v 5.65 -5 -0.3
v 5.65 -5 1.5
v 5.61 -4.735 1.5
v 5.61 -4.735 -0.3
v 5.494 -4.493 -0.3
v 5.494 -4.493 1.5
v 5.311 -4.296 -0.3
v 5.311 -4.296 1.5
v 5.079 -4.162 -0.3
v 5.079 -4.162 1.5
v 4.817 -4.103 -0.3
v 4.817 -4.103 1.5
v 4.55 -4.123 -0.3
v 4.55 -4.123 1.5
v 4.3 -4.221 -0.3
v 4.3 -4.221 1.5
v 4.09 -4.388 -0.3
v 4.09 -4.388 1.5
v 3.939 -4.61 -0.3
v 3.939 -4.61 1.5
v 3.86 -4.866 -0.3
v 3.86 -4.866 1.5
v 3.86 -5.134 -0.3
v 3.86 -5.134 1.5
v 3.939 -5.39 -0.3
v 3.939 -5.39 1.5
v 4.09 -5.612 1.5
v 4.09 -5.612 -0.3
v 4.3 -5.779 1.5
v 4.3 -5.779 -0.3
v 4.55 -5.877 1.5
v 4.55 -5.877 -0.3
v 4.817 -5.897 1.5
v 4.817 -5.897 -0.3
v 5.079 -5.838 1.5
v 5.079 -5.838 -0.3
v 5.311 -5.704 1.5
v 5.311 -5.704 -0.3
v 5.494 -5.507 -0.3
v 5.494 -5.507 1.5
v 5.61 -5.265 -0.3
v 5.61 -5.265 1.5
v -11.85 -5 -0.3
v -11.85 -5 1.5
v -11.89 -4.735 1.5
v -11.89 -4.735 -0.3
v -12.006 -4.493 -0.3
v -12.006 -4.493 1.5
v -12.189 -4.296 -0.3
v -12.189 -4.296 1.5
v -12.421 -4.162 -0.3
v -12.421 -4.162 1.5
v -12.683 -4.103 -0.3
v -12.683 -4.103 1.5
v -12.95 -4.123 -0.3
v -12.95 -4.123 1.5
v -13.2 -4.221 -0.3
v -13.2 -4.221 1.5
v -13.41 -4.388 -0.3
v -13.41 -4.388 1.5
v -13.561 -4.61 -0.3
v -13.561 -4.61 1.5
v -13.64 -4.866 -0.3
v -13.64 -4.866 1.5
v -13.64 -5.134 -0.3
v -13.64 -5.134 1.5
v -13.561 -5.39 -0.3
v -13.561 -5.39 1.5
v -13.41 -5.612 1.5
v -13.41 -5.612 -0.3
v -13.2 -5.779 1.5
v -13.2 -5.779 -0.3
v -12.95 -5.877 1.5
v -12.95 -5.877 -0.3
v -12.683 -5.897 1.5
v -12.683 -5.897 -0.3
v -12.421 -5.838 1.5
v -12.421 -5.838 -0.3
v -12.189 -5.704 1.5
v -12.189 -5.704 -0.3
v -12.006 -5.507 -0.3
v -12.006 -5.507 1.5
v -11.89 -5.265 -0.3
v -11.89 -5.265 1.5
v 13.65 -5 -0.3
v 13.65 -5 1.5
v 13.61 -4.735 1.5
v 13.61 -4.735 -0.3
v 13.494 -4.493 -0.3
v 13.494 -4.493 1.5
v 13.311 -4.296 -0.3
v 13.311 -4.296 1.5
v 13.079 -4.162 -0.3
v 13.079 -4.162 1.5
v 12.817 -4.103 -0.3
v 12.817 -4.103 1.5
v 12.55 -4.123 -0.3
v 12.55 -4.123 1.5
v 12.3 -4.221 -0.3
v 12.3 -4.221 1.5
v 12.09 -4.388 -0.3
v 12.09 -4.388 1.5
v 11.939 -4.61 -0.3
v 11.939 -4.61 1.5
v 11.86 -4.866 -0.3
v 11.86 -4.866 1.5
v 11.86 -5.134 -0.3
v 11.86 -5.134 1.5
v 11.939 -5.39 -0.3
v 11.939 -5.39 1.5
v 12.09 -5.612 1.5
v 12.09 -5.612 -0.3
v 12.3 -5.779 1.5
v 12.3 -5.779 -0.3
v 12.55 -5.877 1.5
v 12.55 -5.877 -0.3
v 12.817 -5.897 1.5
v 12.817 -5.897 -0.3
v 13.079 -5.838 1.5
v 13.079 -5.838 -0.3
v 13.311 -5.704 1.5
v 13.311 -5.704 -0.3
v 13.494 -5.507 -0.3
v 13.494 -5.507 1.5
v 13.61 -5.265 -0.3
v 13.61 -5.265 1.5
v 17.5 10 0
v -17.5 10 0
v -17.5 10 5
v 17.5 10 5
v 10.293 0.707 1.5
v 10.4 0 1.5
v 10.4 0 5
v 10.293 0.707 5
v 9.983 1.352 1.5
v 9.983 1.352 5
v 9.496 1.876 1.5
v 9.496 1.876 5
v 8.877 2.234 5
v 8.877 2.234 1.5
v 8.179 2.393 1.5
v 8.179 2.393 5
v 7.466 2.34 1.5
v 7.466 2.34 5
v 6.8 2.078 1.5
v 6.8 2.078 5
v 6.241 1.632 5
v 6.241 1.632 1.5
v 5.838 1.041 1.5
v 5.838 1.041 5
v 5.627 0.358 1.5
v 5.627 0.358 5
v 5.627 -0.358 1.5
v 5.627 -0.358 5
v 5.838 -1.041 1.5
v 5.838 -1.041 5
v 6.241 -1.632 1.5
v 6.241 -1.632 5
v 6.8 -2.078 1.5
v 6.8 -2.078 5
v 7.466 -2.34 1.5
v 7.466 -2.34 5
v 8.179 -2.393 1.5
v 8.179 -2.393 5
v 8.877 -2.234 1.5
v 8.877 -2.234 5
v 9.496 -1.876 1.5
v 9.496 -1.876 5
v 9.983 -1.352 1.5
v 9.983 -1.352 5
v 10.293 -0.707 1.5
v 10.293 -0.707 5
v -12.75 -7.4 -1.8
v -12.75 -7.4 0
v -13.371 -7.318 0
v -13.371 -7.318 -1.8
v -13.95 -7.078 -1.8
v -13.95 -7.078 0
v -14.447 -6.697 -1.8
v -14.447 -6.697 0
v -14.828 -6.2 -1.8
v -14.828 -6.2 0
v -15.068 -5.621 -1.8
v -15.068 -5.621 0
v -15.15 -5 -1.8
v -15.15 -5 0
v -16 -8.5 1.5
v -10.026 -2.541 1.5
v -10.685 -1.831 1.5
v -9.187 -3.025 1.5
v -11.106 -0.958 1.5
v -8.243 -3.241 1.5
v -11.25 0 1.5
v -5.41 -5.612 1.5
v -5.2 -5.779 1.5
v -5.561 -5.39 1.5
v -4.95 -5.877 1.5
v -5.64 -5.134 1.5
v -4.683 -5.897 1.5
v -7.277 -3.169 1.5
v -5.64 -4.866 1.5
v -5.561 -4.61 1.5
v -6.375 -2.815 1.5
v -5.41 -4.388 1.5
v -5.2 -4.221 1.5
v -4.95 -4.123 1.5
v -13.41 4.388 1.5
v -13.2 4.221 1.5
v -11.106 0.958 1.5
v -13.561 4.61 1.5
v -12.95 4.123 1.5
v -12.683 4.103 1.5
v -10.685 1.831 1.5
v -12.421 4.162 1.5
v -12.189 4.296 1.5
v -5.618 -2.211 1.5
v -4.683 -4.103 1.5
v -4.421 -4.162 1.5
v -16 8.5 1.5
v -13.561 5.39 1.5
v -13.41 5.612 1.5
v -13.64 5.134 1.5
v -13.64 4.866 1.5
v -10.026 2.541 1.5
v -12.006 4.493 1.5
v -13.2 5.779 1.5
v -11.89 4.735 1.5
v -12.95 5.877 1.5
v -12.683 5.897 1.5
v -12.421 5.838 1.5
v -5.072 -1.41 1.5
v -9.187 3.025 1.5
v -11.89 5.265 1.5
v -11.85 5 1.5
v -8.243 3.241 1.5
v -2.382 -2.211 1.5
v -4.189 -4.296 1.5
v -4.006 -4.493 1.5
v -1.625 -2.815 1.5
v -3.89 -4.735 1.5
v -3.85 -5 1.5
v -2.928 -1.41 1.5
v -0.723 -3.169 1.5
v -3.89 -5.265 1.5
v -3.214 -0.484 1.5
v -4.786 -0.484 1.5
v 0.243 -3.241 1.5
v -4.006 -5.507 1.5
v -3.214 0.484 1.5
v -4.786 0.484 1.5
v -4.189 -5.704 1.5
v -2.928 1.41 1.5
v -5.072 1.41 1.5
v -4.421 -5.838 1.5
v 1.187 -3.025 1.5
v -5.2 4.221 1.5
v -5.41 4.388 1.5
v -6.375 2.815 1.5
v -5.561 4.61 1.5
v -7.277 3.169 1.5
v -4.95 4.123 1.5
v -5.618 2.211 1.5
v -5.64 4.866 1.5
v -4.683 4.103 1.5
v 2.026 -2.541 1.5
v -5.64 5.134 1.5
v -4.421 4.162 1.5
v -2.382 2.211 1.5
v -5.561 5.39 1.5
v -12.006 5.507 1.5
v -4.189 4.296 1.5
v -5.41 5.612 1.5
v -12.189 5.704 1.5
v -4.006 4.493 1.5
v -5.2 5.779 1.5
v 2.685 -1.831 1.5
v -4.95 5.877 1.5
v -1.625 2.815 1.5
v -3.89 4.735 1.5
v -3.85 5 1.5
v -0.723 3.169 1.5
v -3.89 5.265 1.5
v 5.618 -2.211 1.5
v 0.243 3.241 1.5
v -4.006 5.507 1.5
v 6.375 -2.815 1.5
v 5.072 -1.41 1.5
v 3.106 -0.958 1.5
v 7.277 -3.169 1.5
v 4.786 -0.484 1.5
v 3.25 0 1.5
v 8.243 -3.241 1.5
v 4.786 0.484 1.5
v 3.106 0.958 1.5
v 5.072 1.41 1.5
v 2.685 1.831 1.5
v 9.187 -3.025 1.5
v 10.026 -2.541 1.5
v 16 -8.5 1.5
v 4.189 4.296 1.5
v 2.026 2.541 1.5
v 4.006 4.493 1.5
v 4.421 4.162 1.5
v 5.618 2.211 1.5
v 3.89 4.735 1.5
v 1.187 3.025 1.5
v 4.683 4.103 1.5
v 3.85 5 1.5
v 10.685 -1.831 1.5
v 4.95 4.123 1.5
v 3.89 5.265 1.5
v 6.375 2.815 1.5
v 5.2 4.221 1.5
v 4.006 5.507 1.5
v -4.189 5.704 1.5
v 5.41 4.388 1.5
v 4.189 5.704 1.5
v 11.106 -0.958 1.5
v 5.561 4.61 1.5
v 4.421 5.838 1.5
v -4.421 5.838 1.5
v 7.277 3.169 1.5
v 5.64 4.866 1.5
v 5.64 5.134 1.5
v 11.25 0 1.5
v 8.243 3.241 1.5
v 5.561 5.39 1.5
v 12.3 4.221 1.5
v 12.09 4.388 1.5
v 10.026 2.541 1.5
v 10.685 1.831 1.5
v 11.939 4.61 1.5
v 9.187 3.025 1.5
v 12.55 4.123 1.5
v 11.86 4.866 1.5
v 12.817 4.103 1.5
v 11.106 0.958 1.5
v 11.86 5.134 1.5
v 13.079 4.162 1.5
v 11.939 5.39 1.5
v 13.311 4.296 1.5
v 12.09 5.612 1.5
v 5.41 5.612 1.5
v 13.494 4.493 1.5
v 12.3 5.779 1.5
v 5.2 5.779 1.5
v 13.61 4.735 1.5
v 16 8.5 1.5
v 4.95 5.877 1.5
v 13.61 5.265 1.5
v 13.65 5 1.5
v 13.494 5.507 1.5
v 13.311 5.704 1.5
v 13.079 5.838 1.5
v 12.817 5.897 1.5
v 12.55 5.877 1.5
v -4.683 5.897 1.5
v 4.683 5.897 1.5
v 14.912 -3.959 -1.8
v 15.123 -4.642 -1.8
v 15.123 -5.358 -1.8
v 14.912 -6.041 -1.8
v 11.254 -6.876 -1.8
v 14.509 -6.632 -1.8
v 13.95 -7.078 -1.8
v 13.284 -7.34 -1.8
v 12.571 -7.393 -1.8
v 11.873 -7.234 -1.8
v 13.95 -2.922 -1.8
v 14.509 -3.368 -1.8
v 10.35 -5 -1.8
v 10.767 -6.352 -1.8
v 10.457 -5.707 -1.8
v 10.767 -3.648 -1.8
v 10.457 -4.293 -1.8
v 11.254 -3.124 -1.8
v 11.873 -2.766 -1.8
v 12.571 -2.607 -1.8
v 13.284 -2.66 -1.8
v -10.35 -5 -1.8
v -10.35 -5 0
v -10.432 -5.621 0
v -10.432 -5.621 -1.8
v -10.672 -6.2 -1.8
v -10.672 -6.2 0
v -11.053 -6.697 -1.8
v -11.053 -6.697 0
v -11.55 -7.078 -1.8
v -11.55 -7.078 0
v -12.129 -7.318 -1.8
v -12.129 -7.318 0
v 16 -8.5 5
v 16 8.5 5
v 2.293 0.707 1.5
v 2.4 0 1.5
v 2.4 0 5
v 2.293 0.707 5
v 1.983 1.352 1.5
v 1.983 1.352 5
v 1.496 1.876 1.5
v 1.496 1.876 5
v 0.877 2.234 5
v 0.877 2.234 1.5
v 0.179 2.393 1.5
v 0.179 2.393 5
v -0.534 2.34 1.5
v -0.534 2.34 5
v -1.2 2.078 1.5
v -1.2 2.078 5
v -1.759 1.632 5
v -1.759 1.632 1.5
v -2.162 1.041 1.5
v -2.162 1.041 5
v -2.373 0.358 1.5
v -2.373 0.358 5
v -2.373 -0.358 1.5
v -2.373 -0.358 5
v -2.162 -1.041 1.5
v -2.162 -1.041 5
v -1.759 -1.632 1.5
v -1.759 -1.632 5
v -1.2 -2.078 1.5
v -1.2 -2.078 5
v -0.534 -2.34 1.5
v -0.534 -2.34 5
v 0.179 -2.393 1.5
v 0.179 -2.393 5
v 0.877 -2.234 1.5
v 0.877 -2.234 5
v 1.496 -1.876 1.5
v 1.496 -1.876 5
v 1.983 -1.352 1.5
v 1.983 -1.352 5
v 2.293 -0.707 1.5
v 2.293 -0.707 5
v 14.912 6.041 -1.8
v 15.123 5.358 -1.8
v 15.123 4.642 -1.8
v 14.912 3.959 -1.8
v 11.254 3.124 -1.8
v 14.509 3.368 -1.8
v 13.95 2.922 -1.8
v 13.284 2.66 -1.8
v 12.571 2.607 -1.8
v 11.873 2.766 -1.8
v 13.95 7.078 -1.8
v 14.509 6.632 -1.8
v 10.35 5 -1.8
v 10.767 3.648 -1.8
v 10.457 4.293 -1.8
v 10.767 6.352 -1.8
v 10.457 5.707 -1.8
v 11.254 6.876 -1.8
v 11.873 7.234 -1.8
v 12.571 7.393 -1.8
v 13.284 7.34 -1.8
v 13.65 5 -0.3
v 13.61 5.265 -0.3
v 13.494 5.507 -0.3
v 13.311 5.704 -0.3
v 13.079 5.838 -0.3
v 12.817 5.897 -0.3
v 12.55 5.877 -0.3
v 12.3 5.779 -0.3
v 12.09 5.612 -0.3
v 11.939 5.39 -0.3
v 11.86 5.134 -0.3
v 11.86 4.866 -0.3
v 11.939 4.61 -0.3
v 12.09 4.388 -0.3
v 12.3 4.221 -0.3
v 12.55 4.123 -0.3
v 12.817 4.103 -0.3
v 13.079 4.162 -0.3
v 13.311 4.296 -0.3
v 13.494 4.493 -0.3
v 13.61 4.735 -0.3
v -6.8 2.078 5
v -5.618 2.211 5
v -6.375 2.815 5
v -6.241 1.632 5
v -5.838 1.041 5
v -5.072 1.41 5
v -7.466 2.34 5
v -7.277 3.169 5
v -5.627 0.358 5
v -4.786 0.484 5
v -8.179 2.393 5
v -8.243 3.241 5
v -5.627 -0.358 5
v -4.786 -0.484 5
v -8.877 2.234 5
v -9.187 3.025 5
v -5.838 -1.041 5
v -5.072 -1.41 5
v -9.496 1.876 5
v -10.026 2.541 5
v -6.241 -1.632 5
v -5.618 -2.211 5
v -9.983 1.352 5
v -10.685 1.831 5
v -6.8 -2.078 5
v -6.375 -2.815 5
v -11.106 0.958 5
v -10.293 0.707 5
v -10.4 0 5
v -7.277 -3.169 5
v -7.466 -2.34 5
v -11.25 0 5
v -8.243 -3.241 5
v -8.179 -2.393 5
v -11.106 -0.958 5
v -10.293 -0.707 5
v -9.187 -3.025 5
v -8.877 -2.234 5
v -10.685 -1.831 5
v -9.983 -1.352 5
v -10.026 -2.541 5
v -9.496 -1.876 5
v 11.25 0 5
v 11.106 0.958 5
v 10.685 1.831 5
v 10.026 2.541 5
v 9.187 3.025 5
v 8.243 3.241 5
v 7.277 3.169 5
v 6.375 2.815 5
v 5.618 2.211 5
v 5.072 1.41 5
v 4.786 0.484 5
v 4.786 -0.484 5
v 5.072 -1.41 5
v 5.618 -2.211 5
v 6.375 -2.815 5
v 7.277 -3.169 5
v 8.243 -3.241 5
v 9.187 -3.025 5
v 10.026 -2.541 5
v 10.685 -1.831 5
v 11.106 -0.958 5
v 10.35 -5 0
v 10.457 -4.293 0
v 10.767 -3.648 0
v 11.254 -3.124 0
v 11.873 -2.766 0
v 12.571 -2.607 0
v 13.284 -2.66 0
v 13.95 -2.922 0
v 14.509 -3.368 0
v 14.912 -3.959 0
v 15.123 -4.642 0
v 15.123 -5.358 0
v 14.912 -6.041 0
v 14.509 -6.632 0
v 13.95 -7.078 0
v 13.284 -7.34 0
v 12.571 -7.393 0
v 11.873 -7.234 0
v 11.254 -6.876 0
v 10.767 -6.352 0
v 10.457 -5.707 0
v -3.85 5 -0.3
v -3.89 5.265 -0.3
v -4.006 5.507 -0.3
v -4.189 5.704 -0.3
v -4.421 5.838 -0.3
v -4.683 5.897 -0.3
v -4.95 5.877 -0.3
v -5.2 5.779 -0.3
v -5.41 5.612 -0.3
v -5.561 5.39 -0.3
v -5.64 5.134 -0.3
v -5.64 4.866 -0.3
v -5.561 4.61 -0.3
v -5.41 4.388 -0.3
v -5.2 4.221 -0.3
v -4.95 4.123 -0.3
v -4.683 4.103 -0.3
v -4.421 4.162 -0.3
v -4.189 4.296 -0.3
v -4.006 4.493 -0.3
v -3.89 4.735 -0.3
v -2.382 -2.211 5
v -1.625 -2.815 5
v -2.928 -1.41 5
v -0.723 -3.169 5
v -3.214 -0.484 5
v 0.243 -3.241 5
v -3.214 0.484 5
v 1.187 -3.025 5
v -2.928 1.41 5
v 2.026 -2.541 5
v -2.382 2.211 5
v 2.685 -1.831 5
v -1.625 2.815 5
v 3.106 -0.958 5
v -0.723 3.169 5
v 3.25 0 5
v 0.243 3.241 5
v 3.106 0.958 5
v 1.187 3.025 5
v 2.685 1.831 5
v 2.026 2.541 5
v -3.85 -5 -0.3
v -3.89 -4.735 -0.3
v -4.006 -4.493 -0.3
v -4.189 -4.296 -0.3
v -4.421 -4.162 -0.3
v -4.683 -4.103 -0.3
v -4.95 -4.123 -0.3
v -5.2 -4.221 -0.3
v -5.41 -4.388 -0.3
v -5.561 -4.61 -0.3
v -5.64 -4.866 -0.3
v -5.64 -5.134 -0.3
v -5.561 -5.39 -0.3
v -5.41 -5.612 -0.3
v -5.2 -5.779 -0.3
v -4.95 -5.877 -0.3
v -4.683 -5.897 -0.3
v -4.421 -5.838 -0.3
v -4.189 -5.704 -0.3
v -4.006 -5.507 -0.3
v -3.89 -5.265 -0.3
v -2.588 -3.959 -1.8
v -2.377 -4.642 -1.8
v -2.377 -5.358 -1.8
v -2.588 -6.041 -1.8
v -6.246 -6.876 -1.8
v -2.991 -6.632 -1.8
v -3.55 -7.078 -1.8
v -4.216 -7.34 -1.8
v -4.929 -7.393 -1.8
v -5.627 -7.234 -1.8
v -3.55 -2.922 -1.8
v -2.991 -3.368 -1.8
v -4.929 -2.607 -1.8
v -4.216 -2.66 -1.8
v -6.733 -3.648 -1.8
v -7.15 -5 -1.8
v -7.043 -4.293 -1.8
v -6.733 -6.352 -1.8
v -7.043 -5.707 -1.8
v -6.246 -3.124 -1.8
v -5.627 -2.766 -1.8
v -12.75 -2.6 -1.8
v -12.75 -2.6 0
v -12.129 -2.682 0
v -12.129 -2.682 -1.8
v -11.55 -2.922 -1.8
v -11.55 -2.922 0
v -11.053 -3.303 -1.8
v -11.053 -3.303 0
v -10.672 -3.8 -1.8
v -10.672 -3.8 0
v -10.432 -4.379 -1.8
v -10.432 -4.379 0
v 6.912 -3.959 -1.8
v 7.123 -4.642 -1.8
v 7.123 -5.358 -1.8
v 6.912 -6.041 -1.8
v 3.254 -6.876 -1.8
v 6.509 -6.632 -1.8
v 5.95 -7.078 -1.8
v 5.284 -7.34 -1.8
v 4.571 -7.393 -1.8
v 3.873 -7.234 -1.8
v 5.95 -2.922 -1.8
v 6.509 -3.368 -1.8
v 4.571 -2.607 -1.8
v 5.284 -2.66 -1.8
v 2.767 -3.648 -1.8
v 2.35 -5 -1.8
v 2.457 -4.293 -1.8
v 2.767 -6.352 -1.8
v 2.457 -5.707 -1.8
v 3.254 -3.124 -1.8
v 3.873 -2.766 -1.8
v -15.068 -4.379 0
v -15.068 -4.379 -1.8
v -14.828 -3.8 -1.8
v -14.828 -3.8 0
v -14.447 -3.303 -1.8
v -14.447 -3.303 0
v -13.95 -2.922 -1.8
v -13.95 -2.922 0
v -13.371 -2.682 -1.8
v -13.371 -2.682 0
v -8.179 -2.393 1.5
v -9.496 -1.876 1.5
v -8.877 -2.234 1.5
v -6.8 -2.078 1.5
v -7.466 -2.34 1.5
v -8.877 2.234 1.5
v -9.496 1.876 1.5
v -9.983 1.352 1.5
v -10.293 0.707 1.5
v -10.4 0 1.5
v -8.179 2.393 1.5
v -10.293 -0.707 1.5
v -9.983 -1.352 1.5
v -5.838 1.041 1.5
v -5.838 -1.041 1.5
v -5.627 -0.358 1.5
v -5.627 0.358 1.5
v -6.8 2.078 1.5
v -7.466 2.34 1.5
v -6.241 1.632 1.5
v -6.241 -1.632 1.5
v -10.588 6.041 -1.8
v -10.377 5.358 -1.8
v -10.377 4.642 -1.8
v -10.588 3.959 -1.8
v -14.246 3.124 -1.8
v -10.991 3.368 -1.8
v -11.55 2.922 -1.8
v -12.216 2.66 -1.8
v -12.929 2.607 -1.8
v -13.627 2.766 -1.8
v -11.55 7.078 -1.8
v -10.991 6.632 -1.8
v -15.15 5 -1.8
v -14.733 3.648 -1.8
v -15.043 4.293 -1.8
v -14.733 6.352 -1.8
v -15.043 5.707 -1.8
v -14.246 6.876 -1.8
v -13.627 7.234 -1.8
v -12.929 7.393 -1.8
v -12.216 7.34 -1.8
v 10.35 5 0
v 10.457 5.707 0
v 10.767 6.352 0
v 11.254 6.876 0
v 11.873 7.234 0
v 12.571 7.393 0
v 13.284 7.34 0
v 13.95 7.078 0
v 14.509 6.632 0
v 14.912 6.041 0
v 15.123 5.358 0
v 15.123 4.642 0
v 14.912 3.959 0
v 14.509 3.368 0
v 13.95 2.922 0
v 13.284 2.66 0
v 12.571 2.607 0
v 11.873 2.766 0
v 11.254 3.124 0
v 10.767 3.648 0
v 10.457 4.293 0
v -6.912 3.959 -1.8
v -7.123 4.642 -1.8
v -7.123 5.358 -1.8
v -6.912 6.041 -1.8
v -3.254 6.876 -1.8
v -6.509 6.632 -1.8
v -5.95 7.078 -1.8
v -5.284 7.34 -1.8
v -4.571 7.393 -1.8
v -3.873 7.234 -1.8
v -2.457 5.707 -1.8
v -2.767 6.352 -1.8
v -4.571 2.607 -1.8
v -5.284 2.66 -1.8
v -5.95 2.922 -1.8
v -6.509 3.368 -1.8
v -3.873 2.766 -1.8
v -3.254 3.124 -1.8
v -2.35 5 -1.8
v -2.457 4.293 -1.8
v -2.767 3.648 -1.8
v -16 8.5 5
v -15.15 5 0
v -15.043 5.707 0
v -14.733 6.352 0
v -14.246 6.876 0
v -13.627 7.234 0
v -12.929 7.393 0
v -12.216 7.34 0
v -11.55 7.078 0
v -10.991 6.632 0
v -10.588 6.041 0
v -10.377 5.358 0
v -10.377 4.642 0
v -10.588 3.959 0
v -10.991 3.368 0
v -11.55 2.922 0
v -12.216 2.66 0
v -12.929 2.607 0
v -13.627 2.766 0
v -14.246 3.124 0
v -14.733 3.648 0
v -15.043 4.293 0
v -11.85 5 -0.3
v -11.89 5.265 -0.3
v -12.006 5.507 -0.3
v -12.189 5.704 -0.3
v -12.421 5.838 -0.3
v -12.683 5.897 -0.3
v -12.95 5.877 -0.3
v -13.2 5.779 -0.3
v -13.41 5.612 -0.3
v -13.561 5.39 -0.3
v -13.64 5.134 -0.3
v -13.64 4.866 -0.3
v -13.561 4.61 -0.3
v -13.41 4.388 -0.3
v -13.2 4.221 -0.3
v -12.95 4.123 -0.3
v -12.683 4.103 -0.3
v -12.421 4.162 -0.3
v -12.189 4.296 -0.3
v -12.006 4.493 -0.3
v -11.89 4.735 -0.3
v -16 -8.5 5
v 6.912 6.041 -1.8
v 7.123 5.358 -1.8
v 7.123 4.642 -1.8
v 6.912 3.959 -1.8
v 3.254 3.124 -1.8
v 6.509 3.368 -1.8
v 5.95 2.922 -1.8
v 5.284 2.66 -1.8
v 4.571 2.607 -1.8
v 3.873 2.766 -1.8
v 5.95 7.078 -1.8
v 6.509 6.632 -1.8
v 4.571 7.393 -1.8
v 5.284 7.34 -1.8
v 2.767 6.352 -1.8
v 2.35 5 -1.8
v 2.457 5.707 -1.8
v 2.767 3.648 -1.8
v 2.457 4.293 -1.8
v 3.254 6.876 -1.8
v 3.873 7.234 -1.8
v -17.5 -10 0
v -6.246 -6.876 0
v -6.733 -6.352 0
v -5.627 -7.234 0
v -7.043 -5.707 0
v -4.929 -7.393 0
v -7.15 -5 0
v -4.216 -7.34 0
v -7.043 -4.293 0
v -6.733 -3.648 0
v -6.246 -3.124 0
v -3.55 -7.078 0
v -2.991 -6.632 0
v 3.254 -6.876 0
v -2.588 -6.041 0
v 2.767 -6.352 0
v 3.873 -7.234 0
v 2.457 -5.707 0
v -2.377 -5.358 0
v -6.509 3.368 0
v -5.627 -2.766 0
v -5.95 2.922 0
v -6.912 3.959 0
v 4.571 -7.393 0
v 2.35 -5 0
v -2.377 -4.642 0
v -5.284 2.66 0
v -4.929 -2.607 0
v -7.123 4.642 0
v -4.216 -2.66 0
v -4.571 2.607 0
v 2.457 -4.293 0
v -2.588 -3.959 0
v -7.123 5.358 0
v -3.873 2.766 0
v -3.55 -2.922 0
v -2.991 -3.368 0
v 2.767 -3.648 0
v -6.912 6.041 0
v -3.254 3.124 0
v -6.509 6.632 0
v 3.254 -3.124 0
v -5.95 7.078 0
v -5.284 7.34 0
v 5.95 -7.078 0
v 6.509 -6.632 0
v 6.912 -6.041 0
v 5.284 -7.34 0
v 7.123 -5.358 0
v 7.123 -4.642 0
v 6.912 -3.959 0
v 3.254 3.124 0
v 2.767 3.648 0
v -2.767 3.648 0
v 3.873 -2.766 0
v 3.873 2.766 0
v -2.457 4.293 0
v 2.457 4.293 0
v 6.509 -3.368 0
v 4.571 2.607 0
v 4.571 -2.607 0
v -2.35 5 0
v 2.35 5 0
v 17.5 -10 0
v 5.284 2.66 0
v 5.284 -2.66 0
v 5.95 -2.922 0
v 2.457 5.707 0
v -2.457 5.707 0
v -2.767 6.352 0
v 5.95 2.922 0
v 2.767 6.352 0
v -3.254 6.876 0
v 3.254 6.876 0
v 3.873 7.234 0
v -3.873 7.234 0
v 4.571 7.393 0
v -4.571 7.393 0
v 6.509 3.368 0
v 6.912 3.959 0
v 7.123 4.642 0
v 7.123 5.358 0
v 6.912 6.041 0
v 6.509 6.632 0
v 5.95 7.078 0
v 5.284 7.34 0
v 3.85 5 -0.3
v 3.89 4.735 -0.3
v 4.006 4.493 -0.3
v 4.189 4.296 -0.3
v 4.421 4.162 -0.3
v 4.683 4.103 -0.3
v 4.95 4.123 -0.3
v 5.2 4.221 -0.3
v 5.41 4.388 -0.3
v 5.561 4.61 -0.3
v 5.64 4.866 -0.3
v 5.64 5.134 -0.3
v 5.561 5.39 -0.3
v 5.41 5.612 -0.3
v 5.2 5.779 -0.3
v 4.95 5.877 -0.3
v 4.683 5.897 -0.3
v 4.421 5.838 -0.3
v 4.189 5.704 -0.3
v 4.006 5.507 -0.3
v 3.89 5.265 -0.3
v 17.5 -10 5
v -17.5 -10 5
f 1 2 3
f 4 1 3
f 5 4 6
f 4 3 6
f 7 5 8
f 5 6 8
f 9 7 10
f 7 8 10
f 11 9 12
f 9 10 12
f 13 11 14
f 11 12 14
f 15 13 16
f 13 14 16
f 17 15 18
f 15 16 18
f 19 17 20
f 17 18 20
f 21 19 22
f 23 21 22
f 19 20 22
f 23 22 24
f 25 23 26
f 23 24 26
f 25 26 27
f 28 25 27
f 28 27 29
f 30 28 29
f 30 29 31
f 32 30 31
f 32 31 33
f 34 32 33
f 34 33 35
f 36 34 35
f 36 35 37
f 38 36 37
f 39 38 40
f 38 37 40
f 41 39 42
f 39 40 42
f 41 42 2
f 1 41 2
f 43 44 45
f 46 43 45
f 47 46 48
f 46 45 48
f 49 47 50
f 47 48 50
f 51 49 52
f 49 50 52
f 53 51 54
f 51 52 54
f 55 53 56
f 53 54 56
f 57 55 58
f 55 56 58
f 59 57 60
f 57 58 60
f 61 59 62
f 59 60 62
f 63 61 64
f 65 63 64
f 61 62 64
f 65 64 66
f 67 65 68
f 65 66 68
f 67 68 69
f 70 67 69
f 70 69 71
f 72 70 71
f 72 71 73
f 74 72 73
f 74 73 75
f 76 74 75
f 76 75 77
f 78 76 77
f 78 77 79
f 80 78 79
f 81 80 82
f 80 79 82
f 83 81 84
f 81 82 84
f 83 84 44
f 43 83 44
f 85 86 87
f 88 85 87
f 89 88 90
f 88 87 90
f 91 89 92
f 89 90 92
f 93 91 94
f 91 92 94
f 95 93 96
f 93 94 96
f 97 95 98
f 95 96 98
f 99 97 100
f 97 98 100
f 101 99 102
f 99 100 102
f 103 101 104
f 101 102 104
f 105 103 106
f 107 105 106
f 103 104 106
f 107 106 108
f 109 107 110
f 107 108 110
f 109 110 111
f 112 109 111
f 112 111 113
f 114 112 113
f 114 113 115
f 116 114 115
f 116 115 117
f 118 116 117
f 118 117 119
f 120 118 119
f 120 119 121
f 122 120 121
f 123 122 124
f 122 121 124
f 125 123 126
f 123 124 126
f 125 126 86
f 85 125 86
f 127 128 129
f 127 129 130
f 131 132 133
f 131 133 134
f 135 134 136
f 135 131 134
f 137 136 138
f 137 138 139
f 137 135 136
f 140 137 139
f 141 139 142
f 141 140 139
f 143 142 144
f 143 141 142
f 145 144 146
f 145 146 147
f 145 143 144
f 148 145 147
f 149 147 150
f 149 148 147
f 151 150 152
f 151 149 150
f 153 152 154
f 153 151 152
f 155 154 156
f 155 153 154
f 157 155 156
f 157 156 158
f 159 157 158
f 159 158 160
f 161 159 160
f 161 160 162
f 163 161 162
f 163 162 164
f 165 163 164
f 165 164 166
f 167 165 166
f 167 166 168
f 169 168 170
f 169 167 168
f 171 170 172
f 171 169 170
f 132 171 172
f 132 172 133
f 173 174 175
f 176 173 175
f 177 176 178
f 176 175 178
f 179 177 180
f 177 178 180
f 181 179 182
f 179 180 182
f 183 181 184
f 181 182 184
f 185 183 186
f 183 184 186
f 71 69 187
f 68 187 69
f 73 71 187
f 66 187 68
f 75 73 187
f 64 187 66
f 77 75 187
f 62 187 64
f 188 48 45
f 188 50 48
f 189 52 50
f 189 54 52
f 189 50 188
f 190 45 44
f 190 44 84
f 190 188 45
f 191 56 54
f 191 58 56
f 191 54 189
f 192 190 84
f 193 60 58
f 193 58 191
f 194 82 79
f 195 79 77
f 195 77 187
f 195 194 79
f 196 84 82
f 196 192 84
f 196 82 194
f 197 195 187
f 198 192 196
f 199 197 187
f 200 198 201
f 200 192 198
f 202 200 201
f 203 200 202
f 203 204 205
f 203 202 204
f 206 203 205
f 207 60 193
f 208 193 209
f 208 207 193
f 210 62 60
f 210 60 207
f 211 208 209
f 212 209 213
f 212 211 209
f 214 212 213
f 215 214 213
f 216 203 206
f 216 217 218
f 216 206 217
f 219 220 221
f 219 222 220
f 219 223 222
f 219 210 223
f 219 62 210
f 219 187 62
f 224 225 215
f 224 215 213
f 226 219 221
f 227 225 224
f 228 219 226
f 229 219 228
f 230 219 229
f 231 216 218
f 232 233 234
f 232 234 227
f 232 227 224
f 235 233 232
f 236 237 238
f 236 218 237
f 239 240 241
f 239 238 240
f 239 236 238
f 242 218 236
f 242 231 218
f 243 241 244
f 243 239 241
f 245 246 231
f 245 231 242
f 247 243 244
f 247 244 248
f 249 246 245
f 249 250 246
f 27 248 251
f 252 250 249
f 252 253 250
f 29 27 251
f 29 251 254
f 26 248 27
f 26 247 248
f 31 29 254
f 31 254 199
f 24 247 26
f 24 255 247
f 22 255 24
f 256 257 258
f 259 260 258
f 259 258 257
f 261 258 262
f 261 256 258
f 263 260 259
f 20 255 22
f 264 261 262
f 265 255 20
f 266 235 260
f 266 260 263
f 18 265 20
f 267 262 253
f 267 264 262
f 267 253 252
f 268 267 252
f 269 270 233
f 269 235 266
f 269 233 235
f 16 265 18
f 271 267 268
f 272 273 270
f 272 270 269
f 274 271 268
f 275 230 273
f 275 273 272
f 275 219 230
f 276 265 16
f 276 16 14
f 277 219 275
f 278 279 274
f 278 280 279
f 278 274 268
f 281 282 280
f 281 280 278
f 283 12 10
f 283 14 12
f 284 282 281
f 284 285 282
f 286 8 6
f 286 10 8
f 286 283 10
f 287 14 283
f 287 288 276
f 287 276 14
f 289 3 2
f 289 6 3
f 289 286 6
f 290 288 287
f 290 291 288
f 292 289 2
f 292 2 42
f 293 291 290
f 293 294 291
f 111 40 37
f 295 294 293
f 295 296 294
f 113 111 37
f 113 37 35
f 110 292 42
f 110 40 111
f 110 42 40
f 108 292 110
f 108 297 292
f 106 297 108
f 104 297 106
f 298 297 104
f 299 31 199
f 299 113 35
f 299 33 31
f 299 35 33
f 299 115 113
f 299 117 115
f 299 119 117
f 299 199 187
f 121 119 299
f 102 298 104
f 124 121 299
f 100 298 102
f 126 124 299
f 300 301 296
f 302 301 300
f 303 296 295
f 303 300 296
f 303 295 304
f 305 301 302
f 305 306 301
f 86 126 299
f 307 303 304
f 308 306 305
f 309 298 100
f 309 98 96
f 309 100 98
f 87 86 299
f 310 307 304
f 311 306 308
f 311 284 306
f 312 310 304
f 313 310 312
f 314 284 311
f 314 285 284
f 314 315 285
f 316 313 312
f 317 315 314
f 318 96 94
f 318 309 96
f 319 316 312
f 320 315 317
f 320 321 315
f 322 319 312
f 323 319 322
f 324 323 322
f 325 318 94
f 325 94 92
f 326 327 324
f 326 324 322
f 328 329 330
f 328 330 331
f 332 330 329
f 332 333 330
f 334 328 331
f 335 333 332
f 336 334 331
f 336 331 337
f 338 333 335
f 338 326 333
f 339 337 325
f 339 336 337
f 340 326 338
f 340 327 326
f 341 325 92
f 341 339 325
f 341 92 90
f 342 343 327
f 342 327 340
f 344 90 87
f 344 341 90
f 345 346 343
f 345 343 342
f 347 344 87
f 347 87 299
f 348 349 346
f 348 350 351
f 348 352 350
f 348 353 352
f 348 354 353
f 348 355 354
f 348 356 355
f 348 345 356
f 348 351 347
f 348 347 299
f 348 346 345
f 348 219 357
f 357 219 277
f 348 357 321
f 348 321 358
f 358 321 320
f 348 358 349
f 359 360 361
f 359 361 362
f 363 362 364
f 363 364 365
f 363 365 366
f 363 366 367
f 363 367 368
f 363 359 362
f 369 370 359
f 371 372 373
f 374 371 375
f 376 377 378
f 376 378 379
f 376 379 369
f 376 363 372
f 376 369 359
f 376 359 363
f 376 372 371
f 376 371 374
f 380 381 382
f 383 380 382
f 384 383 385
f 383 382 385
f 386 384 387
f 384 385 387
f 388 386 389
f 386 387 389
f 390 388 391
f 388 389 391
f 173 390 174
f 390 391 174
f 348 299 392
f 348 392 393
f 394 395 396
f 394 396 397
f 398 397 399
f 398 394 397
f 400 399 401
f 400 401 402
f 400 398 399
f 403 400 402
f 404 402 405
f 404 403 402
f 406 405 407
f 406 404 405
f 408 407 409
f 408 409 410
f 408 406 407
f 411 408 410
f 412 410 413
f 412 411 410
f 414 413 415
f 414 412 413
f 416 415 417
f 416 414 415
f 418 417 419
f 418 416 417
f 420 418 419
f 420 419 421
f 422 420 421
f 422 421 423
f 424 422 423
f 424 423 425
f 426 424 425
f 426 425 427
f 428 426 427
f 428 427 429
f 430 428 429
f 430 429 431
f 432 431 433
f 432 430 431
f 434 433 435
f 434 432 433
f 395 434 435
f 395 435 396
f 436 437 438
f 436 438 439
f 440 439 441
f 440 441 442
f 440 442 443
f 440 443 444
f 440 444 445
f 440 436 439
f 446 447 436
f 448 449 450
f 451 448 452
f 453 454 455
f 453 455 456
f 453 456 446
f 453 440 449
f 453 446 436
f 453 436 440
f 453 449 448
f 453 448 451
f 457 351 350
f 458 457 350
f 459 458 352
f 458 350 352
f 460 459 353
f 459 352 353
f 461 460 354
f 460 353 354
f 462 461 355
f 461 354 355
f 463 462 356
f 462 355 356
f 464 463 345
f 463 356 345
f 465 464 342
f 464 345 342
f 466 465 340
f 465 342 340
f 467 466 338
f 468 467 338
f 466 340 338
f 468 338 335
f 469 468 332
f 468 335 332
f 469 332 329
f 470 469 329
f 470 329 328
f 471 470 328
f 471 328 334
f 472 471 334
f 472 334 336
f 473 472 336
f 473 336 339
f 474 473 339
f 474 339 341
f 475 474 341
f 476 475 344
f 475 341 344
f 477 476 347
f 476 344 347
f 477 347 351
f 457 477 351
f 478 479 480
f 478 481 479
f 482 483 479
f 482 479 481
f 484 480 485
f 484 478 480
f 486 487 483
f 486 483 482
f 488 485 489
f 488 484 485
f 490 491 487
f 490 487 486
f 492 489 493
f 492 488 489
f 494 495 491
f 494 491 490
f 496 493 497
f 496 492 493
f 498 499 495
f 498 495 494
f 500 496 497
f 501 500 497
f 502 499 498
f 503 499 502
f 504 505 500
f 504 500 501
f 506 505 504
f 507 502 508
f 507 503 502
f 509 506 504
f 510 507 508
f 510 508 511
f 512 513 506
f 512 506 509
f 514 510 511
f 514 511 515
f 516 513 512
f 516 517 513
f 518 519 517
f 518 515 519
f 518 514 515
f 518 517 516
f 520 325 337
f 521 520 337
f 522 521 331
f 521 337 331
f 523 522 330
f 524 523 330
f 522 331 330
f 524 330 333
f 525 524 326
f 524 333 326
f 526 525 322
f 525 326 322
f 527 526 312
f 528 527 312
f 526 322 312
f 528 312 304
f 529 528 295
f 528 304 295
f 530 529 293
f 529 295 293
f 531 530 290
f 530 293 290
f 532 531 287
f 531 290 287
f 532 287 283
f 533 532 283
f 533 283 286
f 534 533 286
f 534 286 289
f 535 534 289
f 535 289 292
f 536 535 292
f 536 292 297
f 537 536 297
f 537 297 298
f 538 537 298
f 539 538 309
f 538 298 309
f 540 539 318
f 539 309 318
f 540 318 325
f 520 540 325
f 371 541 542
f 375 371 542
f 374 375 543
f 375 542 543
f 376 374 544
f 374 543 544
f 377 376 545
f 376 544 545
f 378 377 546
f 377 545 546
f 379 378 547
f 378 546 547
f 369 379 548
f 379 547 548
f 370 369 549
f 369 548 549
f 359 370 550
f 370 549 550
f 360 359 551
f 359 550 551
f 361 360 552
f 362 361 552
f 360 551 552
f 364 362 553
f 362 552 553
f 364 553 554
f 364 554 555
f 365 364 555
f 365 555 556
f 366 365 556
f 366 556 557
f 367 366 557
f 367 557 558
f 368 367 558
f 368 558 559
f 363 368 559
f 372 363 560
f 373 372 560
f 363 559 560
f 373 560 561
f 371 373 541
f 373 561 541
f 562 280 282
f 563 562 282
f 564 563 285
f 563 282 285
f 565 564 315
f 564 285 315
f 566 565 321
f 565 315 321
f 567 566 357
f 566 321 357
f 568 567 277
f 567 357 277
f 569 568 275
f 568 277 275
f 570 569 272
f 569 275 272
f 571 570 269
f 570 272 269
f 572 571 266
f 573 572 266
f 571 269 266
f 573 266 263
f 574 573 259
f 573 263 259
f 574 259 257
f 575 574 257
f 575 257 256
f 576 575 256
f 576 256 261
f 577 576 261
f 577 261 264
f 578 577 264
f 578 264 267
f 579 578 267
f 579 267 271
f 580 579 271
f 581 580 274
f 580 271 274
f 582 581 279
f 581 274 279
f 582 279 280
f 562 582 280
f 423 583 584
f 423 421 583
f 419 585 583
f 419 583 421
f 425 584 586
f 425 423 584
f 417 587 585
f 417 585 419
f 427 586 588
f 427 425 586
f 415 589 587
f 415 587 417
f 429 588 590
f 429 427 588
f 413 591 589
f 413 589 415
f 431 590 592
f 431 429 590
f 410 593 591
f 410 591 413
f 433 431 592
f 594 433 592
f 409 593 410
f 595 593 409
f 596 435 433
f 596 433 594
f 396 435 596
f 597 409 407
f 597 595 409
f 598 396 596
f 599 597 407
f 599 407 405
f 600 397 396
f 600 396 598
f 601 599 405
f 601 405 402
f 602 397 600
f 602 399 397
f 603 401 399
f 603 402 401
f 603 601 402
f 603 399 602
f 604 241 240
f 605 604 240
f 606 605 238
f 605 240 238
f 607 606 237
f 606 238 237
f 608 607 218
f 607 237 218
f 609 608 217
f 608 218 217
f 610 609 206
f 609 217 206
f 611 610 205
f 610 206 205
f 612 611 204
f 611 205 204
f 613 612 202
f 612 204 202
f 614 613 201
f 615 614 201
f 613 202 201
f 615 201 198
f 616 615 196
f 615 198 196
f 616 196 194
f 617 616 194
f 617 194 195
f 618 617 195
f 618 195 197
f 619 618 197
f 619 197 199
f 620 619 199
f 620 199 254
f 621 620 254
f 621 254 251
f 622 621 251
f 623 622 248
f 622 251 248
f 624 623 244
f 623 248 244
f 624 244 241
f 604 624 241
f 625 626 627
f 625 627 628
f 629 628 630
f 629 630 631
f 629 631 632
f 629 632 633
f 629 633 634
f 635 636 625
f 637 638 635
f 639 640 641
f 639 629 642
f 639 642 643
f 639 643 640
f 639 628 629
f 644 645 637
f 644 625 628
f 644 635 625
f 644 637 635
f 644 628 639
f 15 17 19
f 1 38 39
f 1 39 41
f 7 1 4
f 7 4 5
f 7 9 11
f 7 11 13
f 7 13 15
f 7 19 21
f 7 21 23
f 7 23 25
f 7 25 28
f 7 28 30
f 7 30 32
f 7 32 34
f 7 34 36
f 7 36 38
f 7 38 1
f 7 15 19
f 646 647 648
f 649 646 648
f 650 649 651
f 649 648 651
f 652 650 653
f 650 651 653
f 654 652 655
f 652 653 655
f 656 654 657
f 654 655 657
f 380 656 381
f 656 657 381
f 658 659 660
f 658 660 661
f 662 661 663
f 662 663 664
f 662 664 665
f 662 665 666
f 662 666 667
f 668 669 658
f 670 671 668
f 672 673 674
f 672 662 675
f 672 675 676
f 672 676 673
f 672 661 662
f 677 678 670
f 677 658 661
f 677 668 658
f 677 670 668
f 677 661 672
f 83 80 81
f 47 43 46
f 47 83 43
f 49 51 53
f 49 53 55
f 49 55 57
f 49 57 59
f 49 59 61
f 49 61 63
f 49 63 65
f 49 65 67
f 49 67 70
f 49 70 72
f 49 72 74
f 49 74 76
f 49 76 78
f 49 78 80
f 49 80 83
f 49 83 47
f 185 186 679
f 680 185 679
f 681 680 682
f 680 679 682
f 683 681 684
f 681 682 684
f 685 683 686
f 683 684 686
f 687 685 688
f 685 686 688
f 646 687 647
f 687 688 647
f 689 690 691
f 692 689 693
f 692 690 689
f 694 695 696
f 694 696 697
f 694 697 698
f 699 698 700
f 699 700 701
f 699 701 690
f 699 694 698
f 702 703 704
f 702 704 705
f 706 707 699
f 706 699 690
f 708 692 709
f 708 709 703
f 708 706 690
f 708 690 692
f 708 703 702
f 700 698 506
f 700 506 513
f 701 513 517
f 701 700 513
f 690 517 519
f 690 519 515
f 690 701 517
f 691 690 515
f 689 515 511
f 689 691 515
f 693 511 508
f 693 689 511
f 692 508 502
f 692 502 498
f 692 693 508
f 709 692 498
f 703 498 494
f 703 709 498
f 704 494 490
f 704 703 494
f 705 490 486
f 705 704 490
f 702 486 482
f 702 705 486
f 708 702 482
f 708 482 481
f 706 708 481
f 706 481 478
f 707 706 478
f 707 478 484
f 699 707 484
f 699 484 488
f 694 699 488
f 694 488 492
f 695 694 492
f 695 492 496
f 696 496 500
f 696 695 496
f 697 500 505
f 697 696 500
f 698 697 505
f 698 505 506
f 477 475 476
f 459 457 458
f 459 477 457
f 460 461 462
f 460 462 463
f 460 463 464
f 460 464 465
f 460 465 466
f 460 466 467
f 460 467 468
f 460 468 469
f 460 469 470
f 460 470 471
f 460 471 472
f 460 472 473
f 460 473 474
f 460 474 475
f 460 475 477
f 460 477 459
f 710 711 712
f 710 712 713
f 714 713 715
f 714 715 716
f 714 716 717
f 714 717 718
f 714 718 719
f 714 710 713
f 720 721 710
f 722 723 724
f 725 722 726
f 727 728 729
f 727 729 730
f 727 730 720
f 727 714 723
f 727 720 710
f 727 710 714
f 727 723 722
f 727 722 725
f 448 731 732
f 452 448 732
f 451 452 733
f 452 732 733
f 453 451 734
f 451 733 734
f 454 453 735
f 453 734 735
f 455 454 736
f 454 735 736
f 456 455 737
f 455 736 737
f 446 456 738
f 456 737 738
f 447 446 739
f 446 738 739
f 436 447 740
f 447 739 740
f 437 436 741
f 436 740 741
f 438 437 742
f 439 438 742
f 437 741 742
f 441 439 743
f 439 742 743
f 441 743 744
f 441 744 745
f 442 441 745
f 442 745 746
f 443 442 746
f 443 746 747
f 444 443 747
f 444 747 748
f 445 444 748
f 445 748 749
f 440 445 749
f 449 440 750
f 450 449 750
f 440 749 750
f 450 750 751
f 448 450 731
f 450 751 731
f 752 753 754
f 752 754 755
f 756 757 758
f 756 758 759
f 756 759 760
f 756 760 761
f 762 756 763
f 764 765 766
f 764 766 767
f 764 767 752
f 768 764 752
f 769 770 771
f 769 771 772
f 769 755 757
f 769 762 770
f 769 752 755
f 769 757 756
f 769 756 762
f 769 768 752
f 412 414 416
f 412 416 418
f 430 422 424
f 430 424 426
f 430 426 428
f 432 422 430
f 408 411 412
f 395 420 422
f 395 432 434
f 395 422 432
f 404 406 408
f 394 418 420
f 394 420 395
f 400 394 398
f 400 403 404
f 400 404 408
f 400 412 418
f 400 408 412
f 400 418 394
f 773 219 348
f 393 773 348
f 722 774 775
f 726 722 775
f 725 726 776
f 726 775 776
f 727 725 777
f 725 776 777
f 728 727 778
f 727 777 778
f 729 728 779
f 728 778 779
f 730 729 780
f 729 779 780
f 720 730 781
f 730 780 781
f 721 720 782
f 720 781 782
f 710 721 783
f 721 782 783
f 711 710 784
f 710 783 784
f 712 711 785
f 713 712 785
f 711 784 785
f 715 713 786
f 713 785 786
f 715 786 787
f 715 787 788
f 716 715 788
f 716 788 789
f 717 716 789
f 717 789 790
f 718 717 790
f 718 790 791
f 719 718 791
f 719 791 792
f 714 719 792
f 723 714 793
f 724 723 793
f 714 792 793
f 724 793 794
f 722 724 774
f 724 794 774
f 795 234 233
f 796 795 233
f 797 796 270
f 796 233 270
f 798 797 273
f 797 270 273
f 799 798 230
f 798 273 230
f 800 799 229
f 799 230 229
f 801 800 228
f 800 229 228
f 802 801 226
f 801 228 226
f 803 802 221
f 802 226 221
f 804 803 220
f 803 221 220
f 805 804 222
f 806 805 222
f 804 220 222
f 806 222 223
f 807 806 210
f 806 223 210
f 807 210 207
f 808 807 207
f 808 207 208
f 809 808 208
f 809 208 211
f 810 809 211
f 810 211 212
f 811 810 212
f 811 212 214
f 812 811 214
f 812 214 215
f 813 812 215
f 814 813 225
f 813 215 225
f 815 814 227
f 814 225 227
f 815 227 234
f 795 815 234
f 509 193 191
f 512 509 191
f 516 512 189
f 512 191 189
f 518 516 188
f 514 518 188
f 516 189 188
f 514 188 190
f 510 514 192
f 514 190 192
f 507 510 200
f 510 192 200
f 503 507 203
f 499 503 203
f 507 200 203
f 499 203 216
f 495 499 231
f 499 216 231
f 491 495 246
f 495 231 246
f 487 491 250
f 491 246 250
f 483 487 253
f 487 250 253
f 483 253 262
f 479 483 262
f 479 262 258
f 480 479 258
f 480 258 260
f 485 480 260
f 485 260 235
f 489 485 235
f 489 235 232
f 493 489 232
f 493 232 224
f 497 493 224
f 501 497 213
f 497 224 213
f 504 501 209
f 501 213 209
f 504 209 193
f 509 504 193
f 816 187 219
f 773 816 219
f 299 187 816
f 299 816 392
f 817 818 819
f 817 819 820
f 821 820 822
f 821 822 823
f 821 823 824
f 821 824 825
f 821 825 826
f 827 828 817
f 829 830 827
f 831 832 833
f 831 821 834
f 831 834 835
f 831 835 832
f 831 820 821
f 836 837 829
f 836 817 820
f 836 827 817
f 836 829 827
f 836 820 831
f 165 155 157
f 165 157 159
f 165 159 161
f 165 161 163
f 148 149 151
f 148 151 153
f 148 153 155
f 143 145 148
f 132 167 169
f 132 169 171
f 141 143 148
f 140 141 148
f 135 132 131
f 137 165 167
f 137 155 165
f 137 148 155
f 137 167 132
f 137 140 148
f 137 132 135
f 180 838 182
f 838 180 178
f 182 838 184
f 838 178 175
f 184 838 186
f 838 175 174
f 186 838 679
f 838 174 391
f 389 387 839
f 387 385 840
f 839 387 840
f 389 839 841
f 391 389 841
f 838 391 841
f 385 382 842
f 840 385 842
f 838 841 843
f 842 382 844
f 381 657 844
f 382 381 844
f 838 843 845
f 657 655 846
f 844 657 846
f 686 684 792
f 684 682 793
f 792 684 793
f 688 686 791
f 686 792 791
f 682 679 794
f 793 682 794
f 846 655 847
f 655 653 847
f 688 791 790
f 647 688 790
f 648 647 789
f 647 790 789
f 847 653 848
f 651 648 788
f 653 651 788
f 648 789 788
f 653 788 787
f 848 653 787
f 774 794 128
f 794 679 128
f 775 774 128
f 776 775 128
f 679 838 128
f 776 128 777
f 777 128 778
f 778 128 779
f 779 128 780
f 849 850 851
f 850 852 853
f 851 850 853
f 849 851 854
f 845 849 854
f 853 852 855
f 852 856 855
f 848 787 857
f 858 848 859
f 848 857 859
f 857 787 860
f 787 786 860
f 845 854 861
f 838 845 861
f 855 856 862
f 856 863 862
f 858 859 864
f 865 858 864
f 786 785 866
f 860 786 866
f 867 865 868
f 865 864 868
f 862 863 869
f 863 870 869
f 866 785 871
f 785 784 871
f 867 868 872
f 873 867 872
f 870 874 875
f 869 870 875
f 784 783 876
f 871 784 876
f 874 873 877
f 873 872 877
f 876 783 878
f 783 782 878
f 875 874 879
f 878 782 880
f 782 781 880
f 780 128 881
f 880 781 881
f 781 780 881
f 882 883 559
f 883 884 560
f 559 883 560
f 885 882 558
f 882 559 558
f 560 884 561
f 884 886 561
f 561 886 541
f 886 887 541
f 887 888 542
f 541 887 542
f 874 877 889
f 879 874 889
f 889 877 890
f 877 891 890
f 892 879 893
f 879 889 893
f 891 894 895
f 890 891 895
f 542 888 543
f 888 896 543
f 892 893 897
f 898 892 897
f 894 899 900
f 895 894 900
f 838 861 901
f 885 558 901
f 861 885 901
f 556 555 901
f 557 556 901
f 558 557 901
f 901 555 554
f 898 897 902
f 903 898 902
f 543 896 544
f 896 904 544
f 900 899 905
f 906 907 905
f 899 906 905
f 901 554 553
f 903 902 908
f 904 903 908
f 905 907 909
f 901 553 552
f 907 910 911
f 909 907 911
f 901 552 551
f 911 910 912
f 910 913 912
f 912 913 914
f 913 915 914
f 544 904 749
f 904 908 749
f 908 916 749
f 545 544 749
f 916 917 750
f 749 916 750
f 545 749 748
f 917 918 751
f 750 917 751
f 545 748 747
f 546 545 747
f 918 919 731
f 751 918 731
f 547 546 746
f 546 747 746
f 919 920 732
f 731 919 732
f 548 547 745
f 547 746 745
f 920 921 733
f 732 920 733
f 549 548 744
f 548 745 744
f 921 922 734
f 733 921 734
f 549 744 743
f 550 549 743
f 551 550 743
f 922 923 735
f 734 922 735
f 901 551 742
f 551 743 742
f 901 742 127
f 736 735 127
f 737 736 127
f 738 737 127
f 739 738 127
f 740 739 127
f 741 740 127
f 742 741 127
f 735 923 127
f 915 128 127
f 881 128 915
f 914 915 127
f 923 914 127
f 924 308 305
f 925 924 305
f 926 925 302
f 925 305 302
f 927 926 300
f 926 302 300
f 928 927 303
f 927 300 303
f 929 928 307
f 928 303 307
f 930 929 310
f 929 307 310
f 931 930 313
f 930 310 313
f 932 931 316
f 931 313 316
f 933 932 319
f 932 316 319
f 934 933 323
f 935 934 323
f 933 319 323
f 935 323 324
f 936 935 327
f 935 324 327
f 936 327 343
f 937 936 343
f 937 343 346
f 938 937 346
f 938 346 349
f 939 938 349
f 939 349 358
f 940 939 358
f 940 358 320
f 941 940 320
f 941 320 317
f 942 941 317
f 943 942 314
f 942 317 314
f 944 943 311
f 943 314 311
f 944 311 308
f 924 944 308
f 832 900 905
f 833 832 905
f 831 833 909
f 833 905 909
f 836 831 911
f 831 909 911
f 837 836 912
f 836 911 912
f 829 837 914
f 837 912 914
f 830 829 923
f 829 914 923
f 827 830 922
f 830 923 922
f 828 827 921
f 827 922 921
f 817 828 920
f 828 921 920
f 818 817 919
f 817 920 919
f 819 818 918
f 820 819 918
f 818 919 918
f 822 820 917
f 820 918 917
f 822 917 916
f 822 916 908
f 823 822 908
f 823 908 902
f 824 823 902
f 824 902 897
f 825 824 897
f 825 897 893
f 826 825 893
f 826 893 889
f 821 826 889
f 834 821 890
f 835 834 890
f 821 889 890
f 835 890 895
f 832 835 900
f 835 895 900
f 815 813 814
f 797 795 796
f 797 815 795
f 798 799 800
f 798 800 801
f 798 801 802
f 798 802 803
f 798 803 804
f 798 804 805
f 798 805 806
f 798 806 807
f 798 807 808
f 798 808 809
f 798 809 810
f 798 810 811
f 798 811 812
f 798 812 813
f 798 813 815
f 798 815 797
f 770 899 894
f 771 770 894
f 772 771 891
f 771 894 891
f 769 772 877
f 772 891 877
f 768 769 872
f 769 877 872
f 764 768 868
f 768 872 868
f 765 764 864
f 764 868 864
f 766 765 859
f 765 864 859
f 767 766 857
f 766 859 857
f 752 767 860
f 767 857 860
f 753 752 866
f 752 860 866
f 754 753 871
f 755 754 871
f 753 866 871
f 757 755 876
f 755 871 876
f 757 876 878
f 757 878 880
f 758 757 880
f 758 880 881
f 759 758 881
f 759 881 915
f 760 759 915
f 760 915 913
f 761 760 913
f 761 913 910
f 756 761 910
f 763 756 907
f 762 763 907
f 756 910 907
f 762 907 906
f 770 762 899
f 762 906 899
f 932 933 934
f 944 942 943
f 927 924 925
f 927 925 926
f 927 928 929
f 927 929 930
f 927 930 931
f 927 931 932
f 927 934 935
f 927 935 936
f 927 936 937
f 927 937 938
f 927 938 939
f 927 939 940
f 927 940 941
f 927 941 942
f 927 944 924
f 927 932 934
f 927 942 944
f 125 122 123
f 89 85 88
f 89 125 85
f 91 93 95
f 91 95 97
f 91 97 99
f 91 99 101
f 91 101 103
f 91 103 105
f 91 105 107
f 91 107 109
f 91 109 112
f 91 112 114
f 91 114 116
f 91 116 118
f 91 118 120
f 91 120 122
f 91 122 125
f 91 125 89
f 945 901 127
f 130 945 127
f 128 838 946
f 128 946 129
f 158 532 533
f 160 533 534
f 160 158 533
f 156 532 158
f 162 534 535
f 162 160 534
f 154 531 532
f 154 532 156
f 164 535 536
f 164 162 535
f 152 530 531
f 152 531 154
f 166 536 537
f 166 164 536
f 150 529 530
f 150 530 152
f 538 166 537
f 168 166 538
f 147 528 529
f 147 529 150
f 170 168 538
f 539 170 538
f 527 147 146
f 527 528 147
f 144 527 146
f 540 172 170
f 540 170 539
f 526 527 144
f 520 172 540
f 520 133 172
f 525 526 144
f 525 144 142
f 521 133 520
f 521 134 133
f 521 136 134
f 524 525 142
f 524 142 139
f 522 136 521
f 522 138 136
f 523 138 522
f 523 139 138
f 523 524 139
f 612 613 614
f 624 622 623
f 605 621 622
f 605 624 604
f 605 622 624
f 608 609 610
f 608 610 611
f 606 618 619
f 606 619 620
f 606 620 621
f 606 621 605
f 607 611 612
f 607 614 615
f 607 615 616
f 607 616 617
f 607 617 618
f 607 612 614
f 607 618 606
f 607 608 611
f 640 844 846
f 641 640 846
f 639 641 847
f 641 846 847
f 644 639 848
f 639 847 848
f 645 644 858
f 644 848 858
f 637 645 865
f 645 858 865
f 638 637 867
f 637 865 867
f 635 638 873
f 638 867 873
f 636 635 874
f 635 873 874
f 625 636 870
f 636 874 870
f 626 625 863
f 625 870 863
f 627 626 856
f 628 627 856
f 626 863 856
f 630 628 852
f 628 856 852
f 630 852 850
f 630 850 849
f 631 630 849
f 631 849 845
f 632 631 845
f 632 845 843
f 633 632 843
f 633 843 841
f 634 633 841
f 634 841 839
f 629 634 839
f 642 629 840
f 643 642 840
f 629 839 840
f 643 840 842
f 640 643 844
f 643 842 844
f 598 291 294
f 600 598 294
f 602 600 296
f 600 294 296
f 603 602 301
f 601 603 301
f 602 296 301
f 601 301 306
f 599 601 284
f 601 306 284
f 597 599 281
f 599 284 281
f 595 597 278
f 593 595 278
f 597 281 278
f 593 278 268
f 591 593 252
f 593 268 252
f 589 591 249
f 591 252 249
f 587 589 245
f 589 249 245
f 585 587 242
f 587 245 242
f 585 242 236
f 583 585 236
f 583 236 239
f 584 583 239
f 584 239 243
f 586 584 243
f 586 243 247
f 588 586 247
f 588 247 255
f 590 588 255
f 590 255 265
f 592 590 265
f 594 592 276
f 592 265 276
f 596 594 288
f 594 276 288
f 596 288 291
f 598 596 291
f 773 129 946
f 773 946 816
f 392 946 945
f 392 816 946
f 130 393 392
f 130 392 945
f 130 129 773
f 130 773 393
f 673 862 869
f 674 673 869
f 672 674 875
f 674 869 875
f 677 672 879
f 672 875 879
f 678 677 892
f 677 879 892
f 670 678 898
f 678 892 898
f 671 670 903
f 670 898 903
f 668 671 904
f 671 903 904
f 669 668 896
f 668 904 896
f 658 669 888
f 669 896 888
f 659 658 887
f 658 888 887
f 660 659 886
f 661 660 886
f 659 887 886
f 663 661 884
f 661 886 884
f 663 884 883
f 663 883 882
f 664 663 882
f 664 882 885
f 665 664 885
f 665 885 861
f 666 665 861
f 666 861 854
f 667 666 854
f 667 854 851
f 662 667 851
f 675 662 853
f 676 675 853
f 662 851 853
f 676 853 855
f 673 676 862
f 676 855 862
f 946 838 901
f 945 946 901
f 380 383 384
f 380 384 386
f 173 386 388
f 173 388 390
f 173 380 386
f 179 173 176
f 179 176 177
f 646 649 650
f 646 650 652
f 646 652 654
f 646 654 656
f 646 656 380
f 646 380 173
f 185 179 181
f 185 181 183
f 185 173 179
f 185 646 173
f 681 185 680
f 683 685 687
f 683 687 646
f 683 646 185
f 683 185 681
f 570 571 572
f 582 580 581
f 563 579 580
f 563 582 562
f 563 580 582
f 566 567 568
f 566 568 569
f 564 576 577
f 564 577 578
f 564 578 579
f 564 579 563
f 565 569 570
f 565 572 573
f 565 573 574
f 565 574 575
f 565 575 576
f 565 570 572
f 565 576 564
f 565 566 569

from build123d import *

# Parameters (mm, degrees)
SKETCH1_W           = 35
SKETCH1_H           = 20
SKETCH1_W_2         = 32
SKETCH1_H_2         = 17
BOSS_EXTRUDE1_DEPTH = 5
SKETCH2_W           = 32
SKETCH2_H           = 17
BOSS_EXTRUDE2_DEPTH = 1.5
SKETCH3_R           = 2.4
BOSS_EXTRUDE3_DEPTH = 1.8
SKETCH6_R           = 3.25
SKETCH6_R_2         = 2.4
BOSS_EXTRUDE4_DEPTH = 3.5
SKETCH7_R           = 0.9
CUT_EXTRUDE2_DEPTH  = 1.8


with BuildPart() as part:
    # Sketch1 → Boss-Extrude1 (new body)
    with BuildSketch(Plane.XY):
        Rectangle(SKETCH1_W, SKETCH1_H)
        Rectangle(SKETCH1_W_2, SKETCH1_H_2, mode=Mode.SUBTRACT)
    extrude(amount=BOSS_EXTRUDE1_DEPTH)

    # Sketch2 → Boss-Extrude2 (add)
    with BuildSketch(Plane.XY):
        Rectangle(SKETCH2_W, SKETCH2_H)
    extrude(amount=BOSS_EXTRUDE2_DEPTH)

    # Sketch3 → Boss-Extrude3 (add)
    with BuildSketch(Plane(origin=(0, 0, 0), x_dir=(-1, 0, 0), z_dir=(0, 0, -1))):
        with BuildLine():
            ThreePointArc((15.15, -5), (14.447056275, -3.302943725), (12.75, -2.6))
            Line((12.75, -2.6), (12.75, -5))
            Line((12.75, -5), (15.15, -5))
        make_face()
        with BuildLine():
            Line((12.75, -5), (12.75, -2.6))
            ThreePointArc((12.75, -2.6), (11.052943725, -3.302943725), (10.35, -5))
            Line((10.35, -5), (12.75, -5))
        make_face()
        with BuildLine():
            Line((12.75, -7.4), (12.75, -5))
            Line((12.75, -5), (10.35, -5))
            ThreePointArc((10.35, -5), (11.052943725, -6.697056275), (12.75, -7.4))
        make_face()
        with BuildLine():
            Line((15.15, -5), (12.75, -5))
            Line((12.75, -5), (12.75, -7.4))
            ThreePointArc((12.75, -7.4), (14.447056275, -6.697056275), (15.15, -5))
        make_face()
        with Locations((12.75, 5)):
            Circle(SKETCH3_R)
        with Locations((-4.75, 5)):
            Circle(SKETCH3_R)
        with Locations((-4.75, -5)):
            Circle(SKETCH3_R)
        with Locations((-12.75, -5)):
            Circle(SKETCH3_R)
        with Locations((-12.75, 5)):
            Circle(SKETCH3_R)
        with Locations((4.75, -5)):
            Circle(SKETCH3_R)
        with Locations(Location((4.75, 5, 0), (0, 0, 180))):
            Circle(SKETCH3_R)
    extrude(amount=BOSS_EXTRUDE3_DEPTH)

    # Sketch6 → Boss-Extrude4 (add)
    # profile 1 of 3: a face of its own
    with BuildSketch(Plane.XY.offset(1.5)):
        Circle(SKETCH6_R)
        Circle(SKETCH6_R_2, mode=Mode.SUBTRACT)
    # profile 2 of 3: a face of its own
    with BuildSketch(Plane.XY.offset(1.5)):
        with Locations((8, 0)):
            Circle(SKETCH6_R)
        with Locations((8, 0)):
            Circle(SKETCH6_R_2, mode=Mode.SUBTRACT)
    # profile 3 of 3: a face of its own
    with BuildSketch(Plane.XY.offset(1.5)):
        with Locations(Location((-8, 0, 0), (0, 0, 180))):
            Circle(SKETCH6_R)
        with Locations(Location((-8, 0, 0), (0, 0, 180))):
            Circle(SKETCH6_R_2, mode=Mode.SUBTRACT)
    extrude(amount=BOSS_EXTRUDE4_DEPTH)

    # Sketch7 → Cut-Extrude2 (cut)
    with BuildSketch(Plane.XY.offset(1.5)):
        with Locations((12.75, 5)):
            Circle(SKETCH7_R)
        with Locations((-12.75, 5)):
            Circle(SKETCH7_R)
        with Locations((-12.75, -5)):
            Circle(SKETCH7_R)
        with Locations((-4.75, -5)):
            Circle(SKETCH7_R)
        with Locations((12.75, -5)):
            Circle(SKETCH7_R)
        with Locations(Location((4.75, 5, 0), (0, 0, 180))):
            Circle(SKETCH7_R)
        with Locations((-4.75, 5)):
            Circle(SKETCH7_R)
        with Locations((4.75, -5)):
            Circle(SKETCH7_R)
    extrude(amount=-CUT_EXTRUDE2_DEPTH, mode=Mode.SUBTRACT)


solid = part.part
